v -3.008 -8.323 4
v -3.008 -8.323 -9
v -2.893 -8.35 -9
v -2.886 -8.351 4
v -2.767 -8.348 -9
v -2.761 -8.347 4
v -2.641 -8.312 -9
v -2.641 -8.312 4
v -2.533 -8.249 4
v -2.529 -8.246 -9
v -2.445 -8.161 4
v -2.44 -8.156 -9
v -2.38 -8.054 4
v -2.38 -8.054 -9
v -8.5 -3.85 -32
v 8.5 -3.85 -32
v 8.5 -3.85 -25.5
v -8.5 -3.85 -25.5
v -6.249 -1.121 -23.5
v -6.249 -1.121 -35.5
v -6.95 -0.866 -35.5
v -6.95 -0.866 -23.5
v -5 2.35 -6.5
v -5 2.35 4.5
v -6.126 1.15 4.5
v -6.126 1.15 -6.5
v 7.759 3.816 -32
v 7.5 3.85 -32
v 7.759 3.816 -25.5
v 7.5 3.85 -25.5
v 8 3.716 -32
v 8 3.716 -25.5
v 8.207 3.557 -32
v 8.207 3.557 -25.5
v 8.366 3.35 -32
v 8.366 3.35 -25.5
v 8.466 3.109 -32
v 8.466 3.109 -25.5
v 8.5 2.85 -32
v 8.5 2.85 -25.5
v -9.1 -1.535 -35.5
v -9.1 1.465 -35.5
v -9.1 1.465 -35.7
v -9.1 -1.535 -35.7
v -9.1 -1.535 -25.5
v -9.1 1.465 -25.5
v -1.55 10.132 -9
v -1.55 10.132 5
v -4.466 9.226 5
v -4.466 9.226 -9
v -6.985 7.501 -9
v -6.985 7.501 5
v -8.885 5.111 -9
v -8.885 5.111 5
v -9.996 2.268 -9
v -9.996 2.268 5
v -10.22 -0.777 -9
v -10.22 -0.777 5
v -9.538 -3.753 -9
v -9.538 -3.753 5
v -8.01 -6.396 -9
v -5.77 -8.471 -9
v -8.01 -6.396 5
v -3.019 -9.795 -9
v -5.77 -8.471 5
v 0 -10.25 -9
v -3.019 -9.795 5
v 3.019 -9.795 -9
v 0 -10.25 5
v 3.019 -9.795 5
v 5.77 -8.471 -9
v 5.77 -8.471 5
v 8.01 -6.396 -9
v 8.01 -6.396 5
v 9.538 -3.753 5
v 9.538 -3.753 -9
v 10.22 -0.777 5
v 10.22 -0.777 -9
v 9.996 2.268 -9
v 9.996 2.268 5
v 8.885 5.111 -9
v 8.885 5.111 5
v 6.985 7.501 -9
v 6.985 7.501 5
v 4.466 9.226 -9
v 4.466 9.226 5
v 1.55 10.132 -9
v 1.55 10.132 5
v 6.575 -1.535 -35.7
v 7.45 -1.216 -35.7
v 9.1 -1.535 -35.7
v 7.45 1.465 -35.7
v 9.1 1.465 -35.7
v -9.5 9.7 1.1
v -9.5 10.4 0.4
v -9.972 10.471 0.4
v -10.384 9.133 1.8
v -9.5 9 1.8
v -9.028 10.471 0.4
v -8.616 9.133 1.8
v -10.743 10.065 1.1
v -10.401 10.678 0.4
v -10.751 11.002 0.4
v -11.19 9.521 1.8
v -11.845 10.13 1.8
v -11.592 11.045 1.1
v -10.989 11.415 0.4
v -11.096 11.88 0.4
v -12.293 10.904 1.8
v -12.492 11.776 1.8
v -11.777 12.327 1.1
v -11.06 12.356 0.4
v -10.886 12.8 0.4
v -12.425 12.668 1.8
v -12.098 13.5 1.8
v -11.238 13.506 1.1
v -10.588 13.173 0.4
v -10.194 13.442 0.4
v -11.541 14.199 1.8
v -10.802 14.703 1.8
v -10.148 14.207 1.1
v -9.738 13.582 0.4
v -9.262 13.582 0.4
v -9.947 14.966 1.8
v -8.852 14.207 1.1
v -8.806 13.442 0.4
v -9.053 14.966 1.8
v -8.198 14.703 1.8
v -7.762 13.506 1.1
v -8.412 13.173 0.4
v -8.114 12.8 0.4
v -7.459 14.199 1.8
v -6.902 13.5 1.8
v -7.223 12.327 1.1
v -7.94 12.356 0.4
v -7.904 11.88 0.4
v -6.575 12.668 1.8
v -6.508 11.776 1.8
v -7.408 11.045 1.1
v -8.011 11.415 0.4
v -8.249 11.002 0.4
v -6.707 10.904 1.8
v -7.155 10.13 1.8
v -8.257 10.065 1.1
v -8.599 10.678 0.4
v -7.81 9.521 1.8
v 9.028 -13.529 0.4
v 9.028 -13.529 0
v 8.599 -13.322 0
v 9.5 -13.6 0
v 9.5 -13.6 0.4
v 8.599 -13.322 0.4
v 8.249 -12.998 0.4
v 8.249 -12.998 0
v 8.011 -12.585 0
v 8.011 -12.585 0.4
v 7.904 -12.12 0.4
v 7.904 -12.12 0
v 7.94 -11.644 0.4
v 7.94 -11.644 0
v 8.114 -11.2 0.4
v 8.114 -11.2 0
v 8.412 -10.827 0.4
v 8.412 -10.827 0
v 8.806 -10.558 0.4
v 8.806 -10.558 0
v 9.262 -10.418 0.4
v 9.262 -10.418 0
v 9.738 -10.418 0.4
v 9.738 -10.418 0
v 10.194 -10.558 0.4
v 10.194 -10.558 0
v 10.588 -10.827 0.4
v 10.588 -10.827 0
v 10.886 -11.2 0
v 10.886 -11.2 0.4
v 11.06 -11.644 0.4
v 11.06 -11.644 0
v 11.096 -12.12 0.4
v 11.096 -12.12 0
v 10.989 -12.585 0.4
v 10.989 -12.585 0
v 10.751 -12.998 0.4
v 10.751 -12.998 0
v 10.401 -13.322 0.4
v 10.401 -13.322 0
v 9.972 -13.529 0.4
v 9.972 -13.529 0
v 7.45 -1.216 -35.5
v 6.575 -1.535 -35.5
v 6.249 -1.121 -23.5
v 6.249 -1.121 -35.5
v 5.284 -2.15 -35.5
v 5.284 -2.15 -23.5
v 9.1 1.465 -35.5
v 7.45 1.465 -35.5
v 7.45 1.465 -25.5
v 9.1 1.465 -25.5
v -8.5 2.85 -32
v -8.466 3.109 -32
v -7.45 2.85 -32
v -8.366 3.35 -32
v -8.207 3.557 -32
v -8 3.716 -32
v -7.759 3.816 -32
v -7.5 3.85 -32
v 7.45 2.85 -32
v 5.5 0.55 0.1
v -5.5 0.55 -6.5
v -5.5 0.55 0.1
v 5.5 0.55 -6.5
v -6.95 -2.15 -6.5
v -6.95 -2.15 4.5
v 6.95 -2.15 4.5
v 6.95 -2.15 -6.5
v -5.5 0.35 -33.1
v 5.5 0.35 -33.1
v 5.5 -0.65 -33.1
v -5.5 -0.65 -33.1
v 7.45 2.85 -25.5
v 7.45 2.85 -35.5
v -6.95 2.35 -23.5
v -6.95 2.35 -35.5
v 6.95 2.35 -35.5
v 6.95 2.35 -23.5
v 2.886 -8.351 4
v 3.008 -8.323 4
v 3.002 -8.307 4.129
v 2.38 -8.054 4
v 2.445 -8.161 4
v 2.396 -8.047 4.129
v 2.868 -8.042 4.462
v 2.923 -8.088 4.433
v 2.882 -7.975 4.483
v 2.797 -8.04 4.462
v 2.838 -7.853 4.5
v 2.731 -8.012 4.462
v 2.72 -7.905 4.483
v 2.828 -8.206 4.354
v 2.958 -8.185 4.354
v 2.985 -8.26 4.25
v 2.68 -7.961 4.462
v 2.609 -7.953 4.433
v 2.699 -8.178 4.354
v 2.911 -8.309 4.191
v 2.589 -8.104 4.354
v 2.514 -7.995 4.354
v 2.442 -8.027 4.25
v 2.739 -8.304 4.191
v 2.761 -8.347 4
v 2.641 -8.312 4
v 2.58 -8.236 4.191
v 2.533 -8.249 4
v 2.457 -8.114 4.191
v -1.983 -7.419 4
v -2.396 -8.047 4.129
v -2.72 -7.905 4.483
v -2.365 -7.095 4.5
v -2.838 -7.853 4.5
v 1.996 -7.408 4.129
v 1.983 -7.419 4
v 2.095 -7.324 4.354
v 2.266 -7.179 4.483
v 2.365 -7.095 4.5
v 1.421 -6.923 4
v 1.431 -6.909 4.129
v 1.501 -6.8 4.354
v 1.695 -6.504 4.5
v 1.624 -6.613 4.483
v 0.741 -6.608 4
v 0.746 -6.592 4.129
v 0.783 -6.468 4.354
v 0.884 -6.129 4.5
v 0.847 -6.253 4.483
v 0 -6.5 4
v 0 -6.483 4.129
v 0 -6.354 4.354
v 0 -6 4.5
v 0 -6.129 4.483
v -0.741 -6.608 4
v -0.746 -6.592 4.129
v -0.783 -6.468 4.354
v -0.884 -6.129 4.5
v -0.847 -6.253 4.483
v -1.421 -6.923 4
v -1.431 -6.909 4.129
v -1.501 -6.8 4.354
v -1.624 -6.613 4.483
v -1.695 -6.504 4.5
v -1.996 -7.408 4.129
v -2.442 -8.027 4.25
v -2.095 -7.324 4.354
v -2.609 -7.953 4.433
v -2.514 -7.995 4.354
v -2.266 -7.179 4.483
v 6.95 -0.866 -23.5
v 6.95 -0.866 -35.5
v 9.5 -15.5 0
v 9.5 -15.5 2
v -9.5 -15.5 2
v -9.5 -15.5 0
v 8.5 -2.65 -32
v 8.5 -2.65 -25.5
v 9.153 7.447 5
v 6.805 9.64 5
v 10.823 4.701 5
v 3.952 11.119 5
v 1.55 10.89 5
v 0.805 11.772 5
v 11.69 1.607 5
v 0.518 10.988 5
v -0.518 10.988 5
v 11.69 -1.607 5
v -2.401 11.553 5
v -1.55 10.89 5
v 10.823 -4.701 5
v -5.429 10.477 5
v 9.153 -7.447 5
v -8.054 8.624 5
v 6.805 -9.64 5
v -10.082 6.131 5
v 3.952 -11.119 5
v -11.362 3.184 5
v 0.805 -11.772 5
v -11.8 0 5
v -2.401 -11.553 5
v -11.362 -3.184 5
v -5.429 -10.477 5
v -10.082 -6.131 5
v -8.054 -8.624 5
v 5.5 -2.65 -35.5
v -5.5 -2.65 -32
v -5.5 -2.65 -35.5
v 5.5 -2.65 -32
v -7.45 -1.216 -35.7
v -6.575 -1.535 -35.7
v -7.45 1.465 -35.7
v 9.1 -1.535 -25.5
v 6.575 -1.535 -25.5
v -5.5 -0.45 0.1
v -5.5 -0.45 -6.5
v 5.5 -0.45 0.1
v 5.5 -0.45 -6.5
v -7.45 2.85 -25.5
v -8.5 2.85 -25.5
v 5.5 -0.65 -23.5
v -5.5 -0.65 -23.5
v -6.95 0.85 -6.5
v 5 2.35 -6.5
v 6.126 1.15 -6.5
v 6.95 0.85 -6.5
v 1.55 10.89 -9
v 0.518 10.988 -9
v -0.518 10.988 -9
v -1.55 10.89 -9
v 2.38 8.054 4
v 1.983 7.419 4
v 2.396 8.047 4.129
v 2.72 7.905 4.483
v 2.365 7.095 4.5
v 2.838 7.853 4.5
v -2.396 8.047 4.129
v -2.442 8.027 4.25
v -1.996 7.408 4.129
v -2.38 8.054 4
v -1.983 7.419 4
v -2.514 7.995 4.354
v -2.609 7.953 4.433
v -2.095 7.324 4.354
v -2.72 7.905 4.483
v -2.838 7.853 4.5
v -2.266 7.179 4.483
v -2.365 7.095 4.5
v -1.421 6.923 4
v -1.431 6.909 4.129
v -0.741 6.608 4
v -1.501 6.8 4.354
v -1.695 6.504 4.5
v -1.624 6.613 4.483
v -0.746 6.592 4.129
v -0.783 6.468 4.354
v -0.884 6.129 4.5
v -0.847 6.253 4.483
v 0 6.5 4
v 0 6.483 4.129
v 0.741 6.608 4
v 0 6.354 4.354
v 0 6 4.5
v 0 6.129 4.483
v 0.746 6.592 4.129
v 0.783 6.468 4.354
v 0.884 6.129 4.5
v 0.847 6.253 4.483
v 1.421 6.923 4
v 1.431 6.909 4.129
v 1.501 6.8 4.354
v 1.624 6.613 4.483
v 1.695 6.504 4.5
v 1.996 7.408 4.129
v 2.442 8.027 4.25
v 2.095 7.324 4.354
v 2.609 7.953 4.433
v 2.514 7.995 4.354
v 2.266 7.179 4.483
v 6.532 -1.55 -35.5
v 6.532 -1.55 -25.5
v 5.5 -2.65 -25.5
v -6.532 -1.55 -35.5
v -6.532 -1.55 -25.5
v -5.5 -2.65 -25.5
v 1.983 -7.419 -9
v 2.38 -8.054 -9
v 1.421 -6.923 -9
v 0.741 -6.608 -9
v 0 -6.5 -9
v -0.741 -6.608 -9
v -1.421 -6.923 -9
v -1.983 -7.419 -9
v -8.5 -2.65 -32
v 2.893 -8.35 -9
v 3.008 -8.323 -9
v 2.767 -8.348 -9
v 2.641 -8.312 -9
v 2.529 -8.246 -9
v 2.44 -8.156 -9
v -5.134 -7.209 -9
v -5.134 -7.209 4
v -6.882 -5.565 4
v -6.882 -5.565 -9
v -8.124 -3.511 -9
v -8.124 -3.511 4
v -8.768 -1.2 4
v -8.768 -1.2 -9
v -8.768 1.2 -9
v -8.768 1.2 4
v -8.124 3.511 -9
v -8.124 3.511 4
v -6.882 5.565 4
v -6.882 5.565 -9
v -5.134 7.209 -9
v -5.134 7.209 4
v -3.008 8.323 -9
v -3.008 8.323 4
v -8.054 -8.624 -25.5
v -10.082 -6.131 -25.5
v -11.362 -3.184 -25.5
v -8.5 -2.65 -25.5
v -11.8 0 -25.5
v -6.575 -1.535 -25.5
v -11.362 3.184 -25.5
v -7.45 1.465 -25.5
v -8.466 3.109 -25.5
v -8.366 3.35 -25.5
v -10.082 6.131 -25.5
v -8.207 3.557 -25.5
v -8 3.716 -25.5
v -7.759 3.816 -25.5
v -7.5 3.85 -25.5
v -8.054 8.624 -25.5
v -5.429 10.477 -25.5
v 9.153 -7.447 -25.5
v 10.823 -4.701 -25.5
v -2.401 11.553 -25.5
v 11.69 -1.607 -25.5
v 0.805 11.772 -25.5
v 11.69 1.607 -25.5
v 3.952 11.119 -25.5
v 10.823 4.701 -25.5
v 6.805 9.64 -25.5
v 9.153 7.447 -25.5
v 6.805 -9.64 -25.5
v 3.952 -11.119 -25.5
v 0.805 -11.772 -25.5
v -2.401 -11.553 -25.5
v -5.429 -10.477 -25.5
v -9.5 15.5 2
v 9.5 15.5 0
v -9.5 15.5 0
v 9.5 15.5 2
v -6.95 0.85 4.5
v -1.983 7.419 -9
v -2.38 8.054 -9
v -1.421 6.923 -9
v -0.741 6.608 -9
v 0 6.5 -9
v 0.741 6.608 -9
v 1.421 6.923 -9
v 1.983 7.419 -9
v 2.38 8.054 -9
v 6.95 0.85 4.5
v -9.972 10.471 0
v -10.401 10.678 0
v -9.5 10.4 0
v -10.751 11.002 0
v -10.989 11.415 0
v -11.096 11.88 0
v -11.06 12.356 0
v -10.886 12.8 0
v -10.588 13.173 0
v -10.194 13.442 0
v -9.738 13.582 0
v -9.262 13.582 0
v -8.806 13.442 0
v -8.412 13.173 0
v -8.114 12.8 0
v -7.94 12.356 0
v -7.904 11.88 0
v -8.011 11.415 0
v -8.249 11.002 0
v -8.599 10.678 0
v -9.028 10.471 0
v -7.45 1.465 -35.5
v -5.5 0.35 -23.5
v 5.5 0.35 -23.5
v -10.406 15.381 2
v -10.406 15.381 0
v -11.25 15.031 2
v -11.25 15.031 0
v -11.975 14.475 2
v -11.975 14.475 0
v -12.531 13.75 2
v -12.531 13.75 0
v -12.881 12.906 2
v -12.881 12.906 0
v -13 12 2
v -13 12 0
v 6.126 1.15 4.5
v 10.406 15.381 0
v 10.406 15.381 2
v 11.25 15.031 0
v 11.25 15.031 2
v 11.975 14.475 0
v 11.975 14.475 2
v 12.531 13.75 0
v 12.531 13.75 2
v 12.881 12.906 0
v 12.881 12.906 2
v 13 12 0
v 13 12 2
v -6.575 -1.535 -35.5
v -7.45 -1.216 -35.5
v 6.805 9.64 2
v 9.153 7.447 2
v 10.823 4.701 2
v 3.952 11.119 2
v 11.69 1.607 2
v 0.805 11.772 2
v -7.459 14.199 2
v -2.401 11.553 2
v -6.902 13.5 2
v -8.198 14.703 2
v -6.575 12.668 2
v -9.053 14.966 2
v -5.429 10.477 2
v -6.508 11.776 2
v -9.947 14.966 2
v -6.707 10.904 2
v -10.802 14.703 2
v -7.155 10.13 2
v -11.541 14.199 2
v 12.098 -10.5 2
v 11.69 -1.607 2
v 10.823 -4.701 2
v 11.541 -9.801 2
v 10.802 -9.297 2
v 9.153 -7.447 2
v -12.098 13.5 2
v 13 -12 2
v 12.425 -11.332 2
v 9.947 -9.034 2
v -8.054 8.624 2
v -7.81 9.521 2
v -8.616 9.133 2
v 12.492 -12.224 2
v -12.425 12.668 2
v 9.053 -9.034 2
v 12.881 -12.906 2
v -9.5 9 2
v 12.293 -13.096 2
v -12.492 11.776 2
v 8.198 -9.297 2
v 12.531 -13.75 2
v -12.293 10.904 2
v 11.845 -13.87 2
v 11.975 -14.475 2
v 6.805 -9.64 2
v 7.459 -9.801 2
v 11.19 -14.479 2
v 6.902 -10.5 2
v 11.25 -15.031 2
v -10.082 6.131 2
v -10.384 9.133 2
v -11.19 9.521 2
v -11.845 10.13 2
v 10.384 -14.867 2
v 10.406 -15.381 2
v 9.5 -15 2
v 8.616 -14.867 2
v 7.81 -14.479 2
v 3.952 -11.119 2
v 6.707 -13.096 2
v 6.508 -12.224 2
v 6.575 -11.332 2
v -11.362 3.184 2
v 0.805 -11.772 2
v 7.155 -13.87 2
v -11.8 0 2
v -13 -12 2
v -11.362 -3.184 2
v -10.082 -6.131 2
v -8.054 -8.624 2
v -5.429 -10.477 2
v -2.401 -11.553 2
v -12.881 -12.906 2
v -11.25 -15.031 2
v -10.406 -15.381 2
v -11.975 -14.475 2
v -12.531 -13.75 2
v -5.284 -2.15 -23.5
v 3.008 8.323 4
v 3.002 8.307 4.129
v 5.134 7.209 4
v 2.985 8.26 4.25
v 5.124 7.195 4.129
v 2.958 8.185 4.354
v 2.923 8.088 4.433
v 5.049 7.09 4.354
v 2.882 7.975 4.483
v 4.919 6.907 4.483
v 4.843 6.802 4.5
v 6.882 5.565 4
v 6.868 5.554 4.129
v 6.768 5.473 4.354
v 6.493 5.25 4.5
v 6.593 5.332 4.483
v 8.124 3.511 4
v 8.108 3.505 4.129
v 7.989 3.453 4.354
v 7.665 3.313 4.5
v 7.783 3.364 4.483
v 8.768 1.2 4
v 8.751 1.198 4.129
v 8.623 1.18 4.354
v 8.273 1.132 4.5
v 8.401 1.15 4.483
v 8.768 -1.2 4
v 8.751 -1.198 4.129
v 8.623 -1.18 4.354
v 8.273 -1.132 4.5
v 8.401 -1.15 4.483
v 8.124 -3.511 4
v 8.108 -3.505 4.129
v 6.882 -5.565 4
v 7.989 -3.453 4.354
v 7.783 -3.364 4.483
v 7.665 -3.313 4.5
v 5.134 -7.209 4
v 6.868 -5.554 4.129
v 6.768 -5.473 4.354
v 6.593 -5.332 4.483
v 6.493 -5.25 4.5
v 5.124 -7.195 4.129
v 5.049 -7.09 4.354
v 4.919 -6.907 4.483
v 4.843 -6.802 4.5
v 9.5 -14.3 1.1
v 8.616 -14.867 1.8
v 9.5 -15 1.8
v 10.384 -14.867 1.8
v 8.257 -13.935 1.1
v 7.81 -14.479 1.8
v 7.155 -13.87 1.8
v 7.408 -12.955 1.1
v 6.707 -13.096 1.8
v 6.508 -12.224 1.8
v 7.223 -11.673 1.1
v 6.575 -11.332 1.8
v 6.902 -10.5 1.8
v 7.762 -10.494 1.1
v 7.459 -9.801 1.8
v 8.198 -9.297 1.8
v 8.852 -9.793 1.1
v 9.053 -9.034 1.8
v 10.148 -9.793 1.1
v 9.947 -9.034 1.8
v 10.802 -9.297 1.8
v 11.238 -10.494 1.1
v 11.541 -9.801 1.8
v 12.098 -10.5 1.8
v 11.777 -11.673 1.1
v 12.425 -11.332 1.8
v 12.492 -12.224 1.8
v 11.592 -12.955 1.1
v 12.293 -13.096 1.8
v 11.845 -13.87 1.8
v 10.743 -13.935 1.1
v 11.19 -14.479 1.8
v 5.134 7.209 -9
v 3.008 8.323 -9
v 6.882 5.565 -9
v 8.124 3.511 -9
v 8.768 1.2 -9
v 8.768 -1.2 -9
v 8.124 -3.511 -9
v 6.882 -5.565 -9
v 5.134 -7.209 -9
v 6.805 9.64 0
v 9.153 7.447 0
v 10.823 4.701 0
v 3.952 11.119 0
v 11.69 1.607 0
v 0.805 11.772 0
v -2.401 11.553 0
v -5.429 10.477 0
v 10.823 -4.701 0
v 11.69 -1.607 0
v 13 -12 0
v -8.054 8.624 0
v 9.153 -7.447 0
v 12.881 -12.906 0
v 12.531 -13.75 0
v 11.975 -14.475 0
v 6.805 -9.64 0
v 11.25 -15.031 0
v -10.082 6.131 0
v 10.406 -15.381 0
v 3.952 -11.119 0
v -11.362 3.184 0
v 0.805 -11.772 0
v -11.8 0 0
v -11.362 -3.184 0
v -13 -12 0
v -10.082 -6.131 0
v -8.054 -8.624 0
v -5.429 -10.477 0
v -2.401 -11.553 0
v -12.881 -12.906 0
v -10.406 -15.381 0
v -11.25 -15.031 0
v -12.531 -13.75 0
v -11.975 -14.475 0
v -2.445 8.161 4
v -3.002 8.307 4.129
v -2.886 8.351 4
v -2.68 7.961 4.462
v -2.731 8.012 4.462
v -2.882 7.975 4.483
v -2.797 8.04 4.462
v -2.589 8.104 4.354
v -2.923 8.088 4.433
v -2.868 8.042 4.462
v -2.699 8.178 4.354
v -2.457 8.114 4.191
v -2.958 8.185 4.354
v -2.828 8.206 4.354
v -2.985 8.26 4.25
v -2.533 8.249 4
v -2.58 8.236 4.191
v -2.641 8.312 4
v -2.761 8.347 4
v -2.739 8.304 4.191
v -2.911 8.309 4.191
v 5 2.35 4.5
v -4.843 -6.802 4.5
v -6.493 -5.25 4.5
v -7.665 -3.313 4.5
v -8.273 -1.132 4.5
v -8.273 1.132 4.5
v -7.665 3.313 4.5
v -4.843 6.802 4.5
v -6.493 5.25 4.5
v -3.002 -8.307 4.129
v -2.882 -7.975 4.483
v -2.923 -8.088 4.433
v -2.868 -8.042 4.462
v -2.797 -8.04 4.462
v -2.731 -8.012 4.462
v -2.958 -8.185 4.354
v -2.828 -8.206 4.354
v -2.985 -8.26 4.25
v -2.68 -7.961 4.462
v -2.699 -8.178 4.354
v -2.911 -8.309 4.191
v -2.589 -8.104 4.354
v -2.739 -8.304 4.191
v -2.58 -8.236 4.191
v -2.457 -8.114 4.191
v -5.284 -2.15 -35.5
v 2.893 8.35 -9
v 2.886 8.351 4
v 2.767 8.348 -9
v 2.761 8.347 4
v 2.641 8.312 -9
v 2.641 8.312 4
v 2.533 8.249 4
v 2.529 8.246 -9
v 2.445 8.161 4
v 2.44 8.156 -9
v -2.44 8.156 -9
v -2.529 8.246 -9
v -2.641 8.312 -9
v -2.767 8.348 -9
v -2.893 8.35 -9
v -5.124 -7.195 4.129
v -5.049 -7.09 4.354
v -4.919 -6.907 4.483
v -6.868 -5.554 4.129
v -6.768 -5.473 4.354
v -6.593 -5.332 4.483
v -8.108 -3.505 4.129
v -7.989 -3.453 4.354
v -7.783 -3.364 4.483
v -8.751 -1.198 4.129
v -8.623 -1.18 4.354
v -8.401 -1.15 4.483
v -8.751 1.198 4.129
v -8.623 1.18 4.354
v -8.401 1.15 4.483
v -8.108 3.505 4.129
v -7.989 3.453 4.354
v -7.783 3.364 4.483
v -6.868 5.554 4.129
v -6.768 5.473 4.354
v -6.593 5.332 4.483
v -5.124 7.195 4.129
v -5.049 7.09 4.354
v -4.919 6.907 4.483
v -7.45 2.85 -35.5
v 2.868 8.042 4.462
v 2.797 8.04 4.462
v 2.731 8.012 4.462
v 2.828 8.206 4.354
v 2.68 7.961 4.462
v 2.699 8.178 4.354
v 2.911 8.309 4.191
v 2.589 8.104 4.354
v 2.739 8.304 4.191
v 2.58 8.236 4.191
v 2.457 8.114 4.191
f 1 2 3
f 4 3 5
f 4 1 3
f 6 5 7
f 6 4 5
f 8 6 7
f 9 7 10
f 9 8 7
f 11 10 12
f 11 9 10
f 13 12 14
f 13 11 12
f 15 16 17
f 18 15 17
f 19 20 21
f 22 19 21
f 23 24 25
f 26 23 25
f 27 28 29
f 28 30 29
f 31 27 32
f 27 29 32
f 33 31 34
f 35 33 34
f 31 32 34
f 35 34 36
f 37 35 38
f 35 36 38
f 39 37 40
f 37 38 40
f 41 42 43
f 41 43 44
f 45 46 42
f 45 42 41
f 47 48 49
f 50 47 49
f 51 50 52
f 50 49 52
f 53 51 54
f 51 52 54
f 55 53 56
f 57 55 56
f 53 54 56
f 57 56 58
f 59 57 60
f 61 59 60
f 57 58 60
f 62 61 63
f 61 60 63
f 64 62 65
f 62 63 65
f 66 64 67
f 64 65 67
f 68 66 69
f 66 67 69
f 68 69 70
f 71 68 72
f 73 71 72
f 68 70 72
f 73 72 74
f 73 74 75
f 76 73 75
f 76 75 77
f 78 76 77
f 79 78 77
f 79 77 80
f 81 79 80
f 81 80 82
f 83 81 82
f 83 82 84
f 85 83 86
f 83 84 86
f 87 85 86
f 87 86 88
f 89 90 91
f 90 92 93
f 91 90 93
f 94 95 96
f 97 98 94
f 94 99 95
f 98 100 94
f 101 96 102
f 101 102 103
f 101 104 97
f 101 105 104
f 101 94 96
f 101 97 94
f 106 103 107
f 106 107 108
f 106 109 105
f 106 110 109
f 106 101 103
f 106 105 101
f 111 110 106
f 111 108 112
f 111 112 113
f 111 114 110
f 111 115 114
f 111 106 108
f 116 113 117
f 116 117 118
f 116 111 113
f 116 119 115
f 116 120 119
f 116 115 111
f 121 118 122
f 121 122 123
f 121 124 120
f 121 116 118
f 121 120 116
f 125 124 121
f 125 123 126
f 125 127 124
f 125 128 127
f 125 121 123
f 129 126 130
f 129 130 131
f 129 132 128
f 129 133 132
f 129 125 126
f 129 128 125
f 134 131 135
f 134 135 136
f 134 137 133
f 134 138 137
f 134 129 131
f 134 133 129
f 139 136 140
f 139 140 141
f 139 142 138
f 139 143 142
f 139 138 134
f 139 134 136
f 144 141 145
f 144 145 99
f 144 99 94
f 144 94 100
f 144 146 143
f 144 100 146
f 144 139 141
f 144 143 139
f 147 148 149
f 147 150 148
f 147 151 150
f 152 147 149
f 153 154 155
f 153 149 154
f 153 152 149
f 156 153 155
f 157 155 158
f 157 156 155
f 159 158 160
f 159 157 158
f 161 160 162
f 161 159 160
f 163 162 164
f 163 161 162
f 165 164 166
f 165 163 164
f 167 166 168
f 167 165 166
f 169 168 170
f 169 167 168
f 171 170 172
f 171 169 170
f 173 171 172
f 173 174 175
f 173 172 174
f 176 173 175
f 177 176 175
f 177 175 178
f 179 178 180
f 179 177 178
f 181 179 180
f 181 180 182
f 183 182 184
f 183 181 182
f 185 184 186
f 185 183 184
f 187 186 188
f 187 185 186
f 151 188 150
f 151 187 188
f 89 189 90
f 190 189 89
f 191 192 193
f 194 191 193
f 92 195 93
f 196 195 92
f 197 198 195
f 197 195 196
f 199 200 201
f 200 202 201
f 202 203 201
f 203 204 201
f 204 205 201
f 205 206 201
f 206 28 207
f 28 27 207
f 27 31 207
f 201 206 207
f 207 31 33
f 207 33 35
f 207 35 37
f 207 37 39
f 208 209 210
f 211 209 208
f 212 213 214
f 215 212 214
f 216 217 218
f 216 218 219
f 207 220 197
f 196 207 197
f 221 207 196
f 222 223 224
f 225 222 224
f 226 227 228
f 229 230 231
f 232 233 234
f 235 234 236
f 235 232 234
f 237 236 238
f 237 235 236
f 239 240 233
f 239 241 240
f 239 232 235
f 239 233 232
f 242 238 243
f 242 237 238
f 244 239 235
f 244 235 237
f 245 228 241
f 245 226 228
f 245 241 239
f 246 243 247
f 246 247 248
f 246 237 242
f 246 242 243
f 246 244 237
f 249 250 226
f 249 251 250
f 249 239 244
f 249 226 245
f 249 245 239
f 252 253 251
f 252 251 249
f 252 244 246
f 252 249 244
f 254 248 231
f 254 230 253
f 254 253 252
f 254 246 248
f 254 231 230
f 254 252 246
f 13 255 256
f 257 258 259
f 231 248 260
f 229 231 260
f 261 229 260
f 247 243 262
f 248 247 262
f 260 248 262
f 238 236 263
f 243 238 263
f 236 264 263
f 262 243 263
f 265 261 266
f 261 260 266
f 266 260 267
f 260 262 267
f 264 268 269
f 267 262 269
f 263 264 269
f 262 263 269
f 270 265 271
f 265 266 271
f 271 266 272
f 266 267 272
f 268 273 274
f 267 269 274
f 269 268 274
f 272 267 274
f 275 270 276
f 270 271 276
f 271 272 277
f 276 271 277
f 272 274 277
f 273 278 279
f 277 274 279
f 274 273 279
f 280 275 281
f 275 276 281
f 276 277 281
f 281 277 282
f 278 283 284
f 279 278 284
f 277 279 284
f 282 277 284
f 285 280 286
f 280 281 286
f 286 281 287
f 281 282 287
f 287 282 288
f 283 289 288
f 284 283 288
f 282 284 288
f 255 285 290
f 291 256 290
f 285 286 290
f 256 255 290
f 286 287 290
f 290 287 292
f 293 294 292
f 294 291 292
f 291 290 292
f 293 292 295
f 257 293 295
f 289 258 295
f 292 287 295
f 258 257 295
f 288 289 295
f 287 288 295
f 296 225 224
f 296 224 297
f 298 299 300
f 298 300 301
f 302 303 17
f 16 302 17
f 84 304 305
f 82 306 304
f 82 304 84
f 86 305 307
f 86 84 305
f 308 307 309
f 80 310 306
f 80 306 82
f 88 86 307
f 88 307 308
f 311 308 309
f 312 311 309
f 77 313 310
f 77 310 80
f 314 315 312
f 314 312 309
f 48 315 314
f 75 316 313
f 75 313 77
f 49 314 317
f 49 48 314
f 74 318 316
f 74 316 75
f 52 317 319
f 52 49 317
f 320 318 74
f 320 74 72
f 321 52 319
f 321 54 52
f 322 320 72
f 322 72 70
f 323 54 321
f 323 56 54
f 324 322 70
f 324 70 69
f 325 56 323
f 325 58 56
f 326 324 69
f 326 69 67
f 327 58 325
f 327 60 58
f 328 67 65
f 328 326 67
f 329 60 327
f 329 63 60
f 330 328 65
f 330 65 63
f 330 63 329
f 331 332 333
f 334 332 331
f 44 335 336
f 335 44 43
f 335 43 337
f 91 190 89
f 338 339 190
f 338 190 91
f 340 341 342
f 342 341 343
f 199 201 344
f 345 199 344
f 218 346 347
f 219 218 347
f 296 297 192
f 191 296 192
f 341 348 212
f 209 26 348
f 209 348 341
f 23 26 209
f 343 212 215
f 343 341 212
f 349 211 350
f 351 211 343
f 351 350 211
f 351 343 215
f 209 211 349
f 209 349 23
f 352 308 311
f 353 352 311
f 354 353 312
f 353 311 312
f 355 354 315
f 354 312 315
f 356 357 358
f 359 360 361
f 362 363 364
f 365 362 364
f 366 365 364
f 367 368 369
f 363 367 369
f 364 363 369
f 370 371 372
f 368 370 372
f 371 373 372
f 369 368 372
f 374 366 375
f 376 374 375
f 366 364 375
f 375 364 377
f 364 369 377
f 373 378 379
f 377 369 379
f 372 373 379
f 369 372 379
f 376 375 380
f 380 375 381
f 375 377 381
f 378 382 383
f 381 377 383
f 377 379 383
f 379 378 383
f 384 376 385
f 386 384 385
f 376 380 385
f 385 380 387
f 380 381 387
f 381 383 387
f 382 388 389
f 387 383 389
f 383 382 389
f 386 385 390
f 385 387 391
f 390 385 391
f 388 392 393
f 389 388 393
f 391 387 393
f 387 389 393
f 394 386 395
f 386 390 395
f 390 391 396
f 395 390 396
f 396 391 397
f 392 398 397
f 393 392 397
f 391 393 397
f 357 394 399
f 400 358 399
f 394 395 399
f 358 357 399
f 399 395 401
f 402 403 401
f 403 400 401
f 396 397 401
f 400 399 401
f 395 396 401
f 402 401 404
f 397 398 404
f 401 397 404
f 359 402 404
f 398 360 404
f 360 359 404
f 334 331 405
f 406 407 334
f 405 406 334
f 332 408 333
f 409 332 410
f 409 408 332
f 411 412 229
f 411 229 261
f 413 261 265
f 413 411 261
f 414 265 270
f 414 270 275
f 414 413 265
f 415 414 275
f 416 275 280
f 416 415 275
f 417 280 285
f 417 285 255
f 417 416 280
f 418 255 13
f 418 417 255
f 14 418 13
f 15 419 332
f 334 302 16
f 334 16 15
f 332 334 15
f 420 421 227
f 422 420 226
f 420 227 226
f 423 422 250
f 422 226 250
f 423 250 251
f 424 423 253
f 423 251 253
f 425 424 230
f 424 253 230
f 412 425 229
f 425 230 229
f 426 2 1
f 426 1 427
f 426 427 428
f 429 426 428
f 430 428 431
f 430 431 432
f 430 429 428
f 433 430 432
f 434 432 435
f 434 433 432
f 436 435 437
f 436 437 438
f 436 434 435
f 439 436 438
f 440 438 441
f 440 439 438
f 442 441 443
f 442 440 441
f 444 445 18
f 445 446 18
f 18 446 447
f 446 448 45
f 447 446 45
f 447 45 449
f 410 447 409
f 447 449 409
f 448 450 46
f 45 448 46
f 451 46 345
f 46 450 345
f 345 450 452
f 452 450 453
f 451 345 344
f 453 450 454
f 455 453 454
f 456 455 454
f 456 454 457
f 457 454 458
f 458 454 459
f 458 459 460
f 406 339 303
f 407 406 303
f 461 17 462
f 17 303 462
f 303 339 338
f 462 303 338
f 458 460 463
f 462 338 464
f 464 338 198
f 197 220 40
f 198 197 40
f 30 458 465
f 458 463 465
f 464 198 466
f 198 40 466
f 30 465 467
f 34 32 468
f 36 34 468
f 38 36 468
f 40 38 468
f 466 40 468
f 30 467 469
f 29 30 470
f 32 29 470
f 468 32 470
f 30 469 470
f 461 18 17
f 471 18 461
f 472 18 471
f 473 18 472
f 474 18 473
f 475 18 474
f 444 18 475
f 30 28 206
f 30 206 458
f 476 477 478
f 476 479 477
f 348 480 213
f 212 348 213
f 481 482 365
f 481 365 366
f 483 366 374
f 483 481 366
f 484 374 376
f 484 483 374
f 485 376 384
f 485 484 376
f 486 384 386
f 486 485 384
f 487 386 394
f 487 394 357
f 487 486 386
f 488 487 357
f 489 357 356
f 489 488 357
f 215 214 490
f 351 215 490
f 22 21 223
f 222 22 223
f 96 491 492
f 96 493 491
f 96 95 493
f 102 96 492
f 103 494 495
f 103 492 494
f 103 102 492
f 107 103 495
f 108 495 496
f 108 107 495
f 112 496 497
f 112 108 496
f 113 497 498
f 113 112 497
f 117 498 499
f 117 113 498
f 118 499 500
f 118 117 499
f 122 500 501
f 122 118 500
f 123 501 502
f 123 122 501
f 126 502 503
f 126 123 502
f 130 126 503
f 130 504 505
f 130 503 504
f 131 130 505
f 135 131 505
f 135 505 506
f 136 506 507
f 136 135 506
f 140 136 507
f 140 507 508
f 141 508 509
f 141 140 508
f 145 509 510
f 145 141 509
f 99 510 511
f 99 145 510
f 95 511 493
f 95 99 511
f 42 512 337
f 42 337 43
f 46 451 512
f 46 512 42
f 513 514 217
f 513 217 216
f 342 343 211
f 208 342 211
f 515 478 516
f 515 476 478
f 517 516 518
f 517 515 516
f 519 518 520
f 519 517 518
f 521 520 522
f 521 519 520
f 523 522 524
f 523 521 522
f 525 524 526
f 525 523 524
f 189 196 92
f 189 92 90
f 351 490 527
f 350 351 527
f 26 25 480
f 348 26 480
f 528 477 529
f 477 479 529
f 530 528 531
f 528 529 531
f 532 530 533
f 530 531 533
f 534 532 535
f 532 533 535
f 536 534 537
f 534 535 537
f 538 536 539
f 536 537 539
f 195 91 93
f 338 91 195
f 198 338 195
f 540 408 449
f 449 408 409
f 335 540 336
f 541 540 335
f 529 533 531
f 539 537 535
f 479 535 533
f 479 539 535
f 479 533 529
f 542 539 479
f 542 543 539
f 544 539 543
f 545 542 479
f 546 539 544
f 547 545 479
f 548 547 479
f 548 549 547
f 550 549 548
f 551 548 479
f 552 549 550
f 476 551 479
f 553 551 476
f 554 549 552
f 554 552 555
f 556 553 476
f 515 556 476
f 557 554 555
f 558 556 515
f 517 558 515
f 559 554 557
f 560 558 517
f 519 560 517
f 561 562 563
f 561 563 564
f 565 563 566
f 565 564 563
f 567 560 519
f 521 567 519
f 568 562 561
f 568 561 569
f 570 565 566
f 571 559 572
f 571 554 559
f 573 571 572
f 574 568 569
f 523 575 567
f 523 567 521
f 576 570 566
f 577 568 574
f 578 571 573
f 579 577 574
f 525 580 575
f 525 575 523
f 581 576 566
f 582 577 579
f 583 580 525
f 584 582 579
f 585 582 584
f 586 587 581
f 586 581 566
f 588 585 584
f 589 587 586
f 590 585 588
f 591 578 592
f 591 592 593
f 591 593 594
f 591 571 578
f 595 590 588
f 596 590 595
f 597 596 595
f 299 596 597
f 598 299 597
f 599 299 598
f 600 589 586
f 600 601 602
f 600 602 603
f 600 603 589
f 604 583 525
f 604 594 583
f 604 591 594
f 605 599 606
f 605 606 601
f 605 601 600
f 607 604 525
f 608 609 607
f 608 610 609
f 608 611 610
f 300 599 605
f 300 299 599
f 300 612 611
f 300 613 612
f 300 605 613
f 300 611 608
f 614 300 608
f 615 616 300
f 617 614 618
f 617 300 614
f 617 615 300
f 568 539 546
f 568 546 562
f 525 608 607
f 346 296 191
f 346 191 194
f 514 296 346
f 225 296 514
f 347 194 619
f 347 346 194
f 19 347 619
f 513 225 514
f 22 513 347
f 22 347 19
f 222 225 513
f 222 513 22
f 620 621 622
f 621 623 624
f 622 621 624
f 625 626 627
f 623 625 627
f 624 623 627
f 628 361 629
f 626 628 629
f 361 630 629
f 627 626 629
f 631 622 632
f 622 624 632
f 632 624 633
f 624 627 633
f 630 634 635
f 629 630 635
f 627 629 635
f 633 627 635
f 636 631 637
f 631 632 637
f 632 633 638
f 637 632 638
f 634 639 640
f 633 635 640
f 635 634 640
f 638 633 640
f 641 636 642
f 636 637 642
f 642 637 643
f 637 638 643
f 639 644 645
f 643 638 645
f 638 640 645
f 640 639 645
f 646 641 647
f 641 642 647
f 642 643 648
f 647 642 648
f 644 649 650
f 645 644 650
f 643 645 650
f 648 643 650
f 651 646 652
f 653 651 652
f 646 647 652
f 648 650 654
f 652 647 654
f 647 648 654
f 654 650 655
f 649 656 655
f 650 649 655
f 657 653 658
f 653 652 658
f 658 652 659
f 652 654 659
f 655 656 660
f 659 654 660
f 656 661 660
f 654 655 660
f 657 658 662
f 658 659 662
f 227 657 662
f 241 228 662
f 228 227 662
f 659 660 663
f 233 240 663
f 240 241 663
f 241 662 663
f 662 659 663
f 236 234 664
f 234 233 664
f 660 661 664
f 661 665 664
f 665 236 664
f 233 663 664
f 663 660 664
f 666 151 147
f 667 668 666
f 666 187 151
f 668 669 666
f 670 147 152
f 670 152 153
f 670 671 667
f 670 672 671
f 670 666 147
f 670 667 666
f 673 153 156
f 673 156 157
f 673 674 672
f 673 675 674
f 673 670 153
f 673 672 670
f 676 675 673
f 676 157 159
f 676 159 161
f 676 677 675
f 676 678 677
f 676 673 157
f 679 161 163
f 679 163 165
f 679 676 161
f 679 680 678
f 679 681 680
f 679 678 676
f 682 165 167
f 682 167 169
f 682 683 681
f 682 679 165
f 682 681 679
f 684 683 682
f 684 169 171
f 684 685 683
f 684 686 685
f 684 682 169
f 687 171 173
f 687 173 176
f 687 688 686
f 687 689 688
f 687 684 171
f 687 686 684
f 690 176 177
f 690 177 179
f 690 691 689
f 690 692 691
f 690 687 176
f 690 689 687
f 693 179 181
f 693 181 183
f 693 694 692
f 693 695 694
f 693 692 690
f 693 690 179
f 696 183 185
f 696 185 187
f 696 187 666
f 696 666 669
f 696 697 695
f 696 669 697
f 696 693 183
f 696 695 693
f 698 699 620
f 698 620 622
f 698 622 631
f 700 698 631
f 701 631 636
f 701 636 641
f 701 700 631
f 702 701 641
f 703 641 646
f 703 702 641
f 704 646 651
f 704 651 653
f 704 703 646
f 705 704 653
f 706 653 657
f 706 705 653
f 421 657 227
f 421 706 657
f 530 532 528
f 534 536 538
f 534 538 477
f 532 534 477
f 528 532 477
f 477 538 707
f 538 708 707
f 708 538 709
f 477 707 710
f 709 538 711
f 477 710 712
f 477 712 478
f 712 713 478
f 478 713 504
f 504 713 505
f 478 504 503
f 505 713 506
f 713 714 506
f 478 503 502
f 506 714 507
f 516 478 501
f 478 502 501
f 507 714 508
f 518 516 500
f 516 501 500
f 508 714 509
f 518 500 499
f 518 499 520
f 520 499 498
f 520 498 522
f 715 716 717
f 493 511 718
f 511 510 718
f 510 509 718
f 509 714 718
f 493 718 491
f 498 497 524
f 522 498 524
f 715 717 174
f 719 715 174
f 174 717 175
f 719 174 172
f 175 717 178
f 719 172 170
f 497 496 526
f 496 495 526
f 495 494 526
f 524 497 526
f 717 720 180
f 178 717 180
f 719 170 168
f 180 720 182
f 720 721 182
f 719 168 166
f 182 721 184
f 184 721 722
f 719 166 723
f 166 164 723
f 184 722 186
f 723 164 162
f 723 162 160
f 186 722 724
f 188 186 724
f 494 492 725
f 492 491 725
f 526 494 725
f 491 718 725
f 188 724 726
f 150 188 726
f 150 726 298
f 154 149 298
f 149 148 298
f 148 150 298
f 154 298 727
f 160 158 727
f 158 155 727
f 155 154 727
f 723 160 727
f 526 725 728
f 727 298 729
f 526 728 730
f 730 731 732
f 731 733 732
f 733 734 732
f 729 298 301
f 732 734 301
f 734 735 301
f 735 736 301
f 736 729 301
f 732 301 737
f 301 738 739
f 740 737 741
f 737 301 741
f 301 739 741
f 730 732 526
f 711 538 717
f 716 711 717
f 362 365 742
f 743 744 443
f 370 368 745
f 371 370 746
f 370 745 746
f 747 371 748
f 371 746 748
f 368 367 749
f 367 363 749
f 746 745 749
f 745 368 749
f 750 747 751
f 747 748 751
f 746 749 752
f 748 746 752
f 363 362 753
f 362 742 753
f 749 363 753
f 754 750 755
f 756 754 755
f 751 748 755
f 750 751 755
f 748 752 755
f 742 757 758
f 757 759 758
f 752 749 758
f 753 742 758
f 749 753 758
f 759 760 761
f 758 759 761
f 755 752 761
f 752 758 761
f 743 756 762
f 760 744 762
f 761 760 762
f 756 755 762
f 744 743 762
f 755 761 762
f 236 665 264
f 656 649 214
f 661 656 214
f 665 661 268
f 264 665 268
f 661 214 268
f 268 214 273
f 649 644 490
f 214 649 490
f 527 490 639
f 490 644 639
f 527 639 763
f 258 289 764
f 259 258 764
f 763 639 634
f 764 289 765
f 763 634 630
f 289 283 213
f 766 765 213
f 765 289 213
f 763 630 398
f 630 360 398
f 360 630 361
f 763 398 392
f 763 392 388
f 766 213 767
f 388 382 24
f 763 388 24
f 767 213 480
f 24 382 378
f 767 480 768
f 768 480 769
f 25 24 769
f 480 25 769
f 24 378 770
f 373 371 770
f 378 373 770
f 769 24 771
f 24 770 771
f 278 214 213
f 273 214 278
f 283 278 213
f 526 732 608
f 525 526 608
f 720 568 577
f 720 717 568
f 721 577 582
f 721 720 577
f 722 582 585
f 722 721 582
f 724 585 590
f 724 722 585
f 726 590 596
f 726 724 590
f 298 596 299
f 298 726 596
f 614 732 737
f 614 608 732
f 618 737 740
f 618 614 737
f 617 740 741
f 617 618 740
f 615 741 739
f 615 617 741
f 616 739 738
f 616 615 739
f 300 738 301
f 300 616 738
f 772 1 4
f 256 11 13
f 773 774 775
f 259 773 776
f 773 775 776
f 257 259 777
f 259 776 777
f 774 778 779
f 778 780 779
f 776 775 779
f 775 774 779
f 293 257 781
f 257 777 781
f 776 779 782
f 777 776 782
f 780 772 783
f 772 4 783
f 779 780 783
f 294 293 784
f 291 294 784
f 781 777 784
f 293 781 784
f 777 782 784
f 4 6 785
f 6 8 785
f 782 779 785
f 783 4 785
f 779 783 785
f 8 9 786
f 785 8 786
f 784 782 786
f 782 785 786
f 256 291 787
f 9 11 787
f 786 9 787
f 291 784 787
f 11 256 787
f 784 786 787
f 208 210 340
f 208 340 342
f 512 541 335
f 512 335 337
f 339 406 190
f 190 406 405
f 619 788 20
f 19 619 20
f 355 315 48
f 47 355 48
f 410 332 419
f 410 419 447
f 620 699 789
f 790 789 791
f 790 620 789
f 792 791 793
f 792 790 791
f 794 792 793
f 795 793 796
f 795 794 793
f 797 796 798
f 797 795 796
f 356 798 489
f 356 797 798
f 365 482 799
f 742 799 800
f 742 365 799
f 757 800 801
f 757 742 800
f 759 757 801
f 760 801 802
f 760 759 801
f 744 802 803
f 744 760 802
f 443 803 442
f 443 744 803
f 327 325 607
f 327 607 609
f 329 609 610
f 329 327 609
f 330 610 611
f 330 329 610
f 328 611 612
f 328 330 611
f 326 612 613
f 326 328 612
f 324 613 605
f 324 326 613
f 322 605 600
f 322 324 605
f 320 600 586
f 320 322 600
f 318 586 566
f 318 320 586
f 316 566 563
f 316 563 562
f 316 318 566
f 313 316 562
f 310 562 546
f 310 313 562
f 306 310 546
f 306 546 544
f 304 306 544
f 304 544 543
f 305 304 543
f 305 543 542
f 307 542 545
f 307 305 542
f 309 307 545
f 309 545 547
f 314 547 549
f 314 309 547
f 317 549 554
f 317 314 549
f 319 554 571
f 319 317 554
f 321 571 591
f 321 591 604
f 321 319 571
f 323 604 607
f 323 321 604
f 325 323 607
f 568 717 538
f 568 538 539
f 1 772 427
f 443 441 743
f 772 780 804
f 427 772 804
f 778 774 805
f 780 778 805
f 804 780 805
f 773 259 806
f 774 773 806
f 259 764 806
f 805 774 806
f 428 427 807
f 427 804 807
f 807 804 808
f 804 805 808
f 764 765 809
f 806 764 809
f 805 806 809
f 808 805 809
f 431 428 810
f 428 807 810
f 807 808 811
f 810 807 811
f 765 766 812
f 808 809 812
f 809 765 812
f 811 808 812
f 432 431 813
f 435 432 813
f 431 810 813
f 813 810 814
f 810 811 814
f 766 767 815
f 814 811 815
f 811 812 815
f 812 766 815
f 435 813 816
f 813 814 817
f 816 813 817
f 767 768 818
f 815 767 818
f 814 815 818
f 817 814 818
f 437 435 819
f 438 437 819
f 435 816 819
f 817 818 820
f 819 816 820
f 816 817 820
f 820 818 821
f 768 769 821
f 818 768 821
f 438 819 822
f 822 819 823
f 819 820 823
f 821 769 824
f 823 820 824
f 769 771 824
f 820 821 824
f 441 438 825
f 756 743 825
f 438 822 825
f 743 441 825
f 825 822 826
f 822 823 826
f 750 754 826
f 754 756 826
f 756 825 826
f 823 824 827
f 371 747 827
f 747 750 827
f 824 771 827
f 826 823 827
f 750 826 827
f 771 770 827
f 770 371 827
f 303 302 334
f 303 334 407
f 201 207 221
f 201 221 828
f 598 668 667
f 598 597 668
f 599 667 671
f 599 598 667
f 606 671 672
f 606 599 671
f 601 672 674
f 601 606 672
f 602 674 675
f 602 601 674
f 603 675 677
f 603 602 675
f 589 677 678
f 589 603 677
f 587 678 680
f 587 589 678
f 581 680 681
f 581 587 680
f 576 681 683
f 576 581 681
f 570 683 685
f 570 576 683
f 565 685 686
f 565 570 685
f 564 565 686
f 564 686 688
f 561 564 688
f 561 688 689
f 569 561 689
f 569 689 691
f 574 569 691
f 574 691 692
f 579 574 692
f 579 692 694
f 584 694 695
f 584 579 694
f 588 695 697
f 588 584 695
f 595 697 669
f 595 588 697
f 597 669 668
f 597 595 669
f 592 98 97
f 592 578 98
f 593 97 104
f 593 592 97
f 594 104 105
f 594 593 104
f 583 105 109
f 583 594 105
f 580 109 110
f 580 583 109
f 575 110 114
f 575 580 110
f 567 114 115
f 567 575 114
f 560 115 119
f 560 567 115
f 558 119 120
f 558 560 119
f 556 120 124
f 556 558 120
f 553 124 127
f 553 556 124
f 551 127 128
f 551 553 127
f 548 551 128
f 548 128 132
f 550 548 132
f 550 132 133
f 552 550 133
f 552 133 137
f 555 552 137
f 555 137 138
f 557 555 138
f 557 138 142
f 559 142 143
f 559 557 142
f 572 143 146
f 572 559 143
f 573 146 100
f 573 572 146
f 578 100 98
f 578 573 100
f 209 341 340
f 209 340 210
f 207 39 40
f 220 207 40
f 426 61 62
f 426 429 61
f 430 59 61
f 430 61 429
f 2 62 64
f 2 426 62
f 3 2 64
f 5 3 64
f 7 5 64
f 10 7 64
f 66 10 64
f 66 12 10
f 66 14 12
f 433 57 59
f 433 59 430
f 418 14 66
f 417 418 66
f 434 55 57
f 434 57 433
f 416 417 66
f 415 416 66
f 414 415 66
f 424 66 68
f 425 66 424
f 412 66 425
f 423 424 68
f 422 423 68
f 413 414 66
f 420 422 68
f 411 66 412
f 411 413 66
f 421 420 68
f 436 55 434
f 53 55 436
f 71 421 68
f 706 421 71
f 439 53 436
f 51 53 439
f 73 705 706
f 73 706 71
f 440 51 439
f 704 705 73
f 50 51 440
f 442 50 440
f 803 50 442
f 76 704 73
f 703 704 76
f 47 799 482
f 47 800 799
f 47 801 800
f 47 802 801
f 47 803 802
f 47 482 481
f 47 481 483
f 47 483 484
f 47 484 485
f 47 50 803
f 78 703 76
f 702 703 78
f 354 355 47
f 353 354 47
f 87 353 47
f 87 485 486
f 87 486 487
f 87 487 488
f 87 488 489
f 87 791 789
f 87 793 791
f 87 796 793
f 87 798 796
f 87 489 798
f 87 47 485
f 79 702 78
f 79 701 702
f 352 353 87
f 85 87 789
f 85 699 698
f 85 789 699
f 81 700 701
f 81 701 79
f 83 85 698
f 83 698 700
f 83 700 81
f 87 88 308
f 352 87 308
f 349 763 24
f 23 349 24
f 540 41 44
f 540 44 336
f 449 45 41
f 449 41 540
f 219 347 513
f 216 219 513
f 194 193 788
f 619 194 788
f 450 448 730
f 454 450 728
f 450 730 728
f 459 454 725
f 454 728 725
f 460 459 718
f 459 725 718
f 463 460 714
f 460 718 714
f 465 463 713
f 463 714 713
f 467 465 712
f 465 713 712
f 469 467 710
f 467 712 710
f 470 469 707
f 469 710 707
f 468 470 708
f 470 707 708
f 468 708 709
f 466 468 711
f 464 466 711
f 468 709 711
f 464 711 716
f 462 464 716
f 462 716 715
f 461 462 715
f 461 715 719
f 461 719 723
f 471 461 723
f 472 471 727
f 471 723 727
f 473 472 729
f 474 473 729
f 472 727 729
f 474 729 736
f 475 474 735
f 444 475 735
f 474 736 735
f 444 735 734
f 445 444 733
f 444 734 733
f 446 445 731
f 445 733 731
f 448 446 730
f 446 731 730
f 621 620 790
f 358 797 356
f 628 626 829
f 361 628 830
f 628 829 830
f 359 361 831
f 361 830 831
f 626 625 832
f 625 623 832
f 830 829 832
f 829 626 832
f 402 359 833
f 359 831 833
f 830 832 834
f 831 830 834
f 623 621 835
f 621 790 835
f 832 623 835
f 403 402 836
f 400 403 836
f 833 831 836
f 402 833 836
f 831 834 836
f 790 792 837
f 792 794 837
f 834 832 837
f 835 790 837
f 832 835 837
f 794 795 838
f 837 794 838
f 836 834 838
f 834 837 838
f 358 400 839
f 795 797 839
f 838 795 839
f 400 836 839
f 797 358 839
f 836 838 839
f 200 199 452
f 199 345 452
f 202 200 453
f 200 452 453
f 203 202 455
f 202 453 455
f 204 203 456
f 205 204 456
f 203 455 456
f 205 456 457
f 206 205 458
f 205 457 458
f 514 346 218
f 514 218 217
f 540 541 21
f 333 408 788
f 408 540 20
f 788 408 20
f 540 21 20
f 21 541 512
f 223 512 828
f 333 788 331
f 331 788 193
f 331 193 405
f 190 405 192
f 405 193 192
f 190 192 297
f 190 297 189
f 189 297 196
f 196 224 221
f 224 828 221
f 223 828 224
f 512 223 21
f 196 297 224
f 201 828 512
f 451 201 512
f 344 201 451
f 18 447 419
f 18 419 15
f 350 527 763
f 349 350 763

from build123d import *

# Parameters (mm, degrees)
ESQUISSE1_W                                 = 11.8
ESQUISSE1_H                                 = 25.5
ESQUISSE2_W                                 = 24.8
ESQUISSE2_H                                 = 27.3
BOSS_EXTRU_1_DEPTH                          = 2
ESQUISSE3_W                                 = 2
ESQUISSE3_H                                 = 27.3
BOSS_EXTRU_2_DEPTH                          = 1.2
BOSS_EXTRU_3_DEPTH                          = 10
ESQUISSE5_W                                 = 10
ESQUISSE5_H                                 = 1.115484429
ENL_V_MAT_EXTRU_1_DEPTH                     = 3.6
ESQUISSE6_W                                 = 10
ESQUISSE6_H                                 = 1.384515571
ENL_V_MAT_EXTRU_2_DEPTH                     = 1.65
ESQUISSE7_W                                 = 10
ESQUISSE7_H                                 = 1.384515571
ENL_V_MAT_EXTRU_3_DEPTH                     = 1.65
BOSS_EXTRU_4_DEPTH                          = 0.2
BOSS_EXTRU_5_DEPTH                          = 0.2
ESQUISSE10_W                                = 26
ESQUISSE10_H                                = 2
BOSS_EXTRU_6_DEPTH                          = 3.7
BOSS_EXTRU_7_START                          = 3
ESQUISSE11_R                                = 11.8
BOSS_EXTRU_7_DEPTH                          = 3
ENL_V_MAT_EXTRU_4_DEPTH                     = 14
BOSS_EXTRU_8_DEPTH                          = 13.5
ENL_V_MAT_EXTRU_5_DEPTH                     = 11
ESQUISSE15_W                                = 11
ESQUISSE15_H                                = 1
BOSS_EXTRU_9_DEPTH                          = 6.6
ENL_V_MAT_EXTRU_6_DEPTH                     = 12
ESQUISSE17_W                                = 11
ESQUISSE17_H                                = 1
BOSS_EXTRU_10_DEPTH                         = 9.6
D_POUILLE1_ANGLE                            = 20.013261752
D_POUILLE2_ANGLE                            = 20.013261752
D_POUILLE3_ANGLE                            = 20.013261752
D_POUILLE4_ANGLE                            = 20.013261752
D_POUILLE5_ANGLE                            = 43.186676481
D_POUILLE6_ANGLE                            = 43.186676481
D_POUILLE7_ANGLE                            = 43.186676481
FRAISAGE_POUR_VIS_T_TE_FRAIS_E_M31_AT_COUNT = 2
FRAISAGE_POUR_VIS_T_TE_FRAIS_E_M31_AT_PITCH = 30.61045573
NERVURE1_START                              = -8.5
NERVURE1_OUTLINE_W                          = 1
NERVURE1_OUTLINE_H                          = 6.5
NERVURE1_DEPTH                              = 17
NERVURE2_START                              = -8.5
NERVURE2_OUTLINE_W                          = 1.2
NERVURE2_OUTLINE_H                          = 6.5
NERVURE2_DEPTH                              = 17
CHANFREIN1_SIZE                             = 0.027978428
CHANFREIN1_SIZE2                            = 0.021236921
CHANFREIN2_SIZE                             = 0.027978428
CHANFREIN2_SIZE2                            = 0.021236921
CONG_1_R                                    = 0.5
CONG_2_R                                    = 1
CONG_3_R                                    = 3.5


# Read off the part's stored shape, not the designer's step: Nervure1, Nervure2
with BuildPart() as part:
    # Esquisse1 → Révolution1 (revolve)
    with BuildSketch(Plane.XZ, mode=Mode.PRIVATE) as r_volution1_sk:
        with Locations((5.9, -12.75)):
            Rectangle(ESQUISSE1_W, ESQUISSE1_H)
    revolve(r_volution1_sk.sketch.rotate(Axis((0, 0, 0), (0, 0, -1)), 180), axis=Axis((0, 0, 0), (0, 0, -1)))

    # Esquisse2 → Boss.-Extru.1 (add)
    with BuildSketch(Plane(origin=(0, 0, 0), x_dir=(-1, 0, 0), z_dir=(0, 0, -1))):
        with Locations((0.6, -1.85)):
            Rectangle(ESQUISSE2_W, ESQUISSE2_H)
    extrude(amount=-BOSS_EXTRU_1_DEPTH)

    # Esquisse3 → Boss.-Extru.2 (add)
    with BuildSketch(Plane(origin=(11.8, 0, 0), x_dir=(0, 0, -1), z_dir=(1, 0, 0))):
        with Locations((-1, -1.85)):
            Rectangle(ESQUISSE3_W, ESQUISSE3_H)
    extrude(amount=BOSS_EXTRU_2_DEPTH)

    # Esquisse4 → Boss.-Extru.3 (add)
    with BuildSketch(Plane(origin=(0, 0, -25.5), x_dir=(-1, 0, 0), z_dir=(0, 0, -1))):
        Polygon((-9.1, 2.85), (9.1, 2.85), (9.1, -2.65), (-5.5, -2.65), (-5.5, -1.534515571), (-9.1, -1.534515571), align=None)
    extrude(amount=BOSS_EXTRU_3_DEPTH)

    # Esquisse5 → Enlèv. mat.-Extru.1 (cut)
    with BuildSketch(Plane.ZY.offset(9.1)):
        with Locations((-30.5, -2.092257786)):
            Rectangle(ESQUISSE5_W, ESQUISSE5_H)
    extrude(amount=-ENL_V_MAT_EXTRU_1_DEPTH, mode=Mode.SUBTRACT)

    # Esquisse6 → Enlèv. mat.-Extru.2 (cut)
    with BuildSketch(Plane(origin=(9.1, 0, 0), x_dir=(0, 0, -1), z_dir=(1, 0, 0))):
        with Locations((30.5, 2.157742215)):
            Rectangle(ESQUISSE6_W, ESQUISSE6_H)
    extrude(amount=-ENL_V_MAT_EXTRU_2_DEPTH, mode=Mode.SUBTRACT)

    # Esquisse7 → Enlèv. mat.-Extru.3 (cut)
    with BuildSketch(Plane.ZY.offset(9.1)):
        with Locations((-30.5, 2.157742215)):
            Rectangle(ESQUISSE7_W, ESQUISSE7_H)
    extrude(amount=-ENL_V_MAT_EXTRU_3_DEPTH, mode=Mode.SUBTRACT)

    # Esquisse8 → Boss.-Extru.4 (add)
    with BuildSketch(Plane(origin=(0, 0, -35.5), x_dir=(-1, 0, 0), z_dir=(0, 0, -1))):
        Polygon((-6.575, -1.534515571), (-9.1, -1.534515571), (-9.1, 1.465484429), (-7.45, 1.465484429), (-7.45, -1.215812238), align=None)
    extrude(amount=BOSS_EXTRU_4_DEPTH)

    # Esquisse9 → Boss.-Extru.5 (add)
    with BuildSketch(Plane(origin=(0, 0, -35.5), x_dir=(-1, 0, 0), z_dir=(0, 0, -1))):
        Polygon((6.575, -1.534515571), (7.45, -1.215812238), (7.45, 1.465484429), (9.1, 1.465484429), (9.1, -1.534515571), align=None)
    extrude(amount=BOSS_EXTRU_5_DEPTH)

    # Esquisse10 → Boss.-Extru.6 (add)
    with BuildSketch(Plane(origin=(0, 11.8, 0), x_dir=(-1, 0, 0), z_dir=(0, 1, 0))):
        with Locations((0, 1)):
            Rectangle(ESQUISSE10_W, ESQUISSE10_H)
    extrude(amount=BOSS_EXTRU_6_DEPTH)

    # Esquisse11 → Boss.-Extru.7 (add)
    with BuildSketch(Plane.XY.offset(2).offset(BOSS_EXTRU_7_START)):
        with Locations(Location((0, 0, 0), (0, 0, 180))):
            Circle(ESQUISSE11_R)
    extrude(amount=-BOSS_EXTRU_7_DEPTH)

    # Esquisse12 → Enlèv. mat.-Extru.4 (cut)
    with BuildSketch(Plane.XY.offset(5)):
        with BuildLine():
            Line((1.55, 10.132127121), (1.55, 10.890247931))
            ThreePointArc((1.55, 10.890247931), (0, 11), (-1.55, 10.890247931))
            Line((-1.55, 10.890247931), (-1.55, 10.132127121))
            ThreePointArc((-1.55, 10.132127121), (0, -10.25), (1.55, 10.132127121))
        make_face()
    extrude(amount=-ENL_V_MAT_EXTRU_4_DEPTH, mode=Mode.SUBTRACT)

    # Esquisse13 → Boss.-Extru.8 (add)
    with BuildSketch(Plane.XY.offset(-9)):
        with BuildLine():
            ThreePointArc((2.525486644, -8.482005495), (0, -6.5), (-2.525486644, -8.482005495))
            ThreePointArc((-2.525486644, -8.482005495), (-8.85, 0), (-2.525486644, 8.482005495))
            ThreePointArc((-2.525486644, 8.482005495), (0, 6.5), (2.525486644, 8.482005495))
            ThreePointArc((2.525486644, 8.482005495), (8.85, 0), (2.525486644, -8.482005495))
        make_face()
    extrude(amount=BOSS_EXTRU_8_DEPTH)

    # Esquisse14 → Enlèv. mat.-Extru.5 (cut)
    with BuildSketch(Plane.XY.offset(4.5)):
        Polygon((5, 0.85), (5, 2.35), (-5, 2.35), (-5, 0.85), (-6.95, 0.85), (-6.95, -2.15), (6.95, -2.15), (6.95, 0.85), align=None)
    extrude(amount=-ENL_V_MAT_EXTRU_5_DEPTH, mode=Mode.SUBTRACT)

    # Esquisse15 → Boss.-Extru.9 (add)
    with BuildSketch(Plane.XY.offset(-6.5)):
        with Locations((0, 0.05)):
            Rectangle(ESQUISSE15_W, ESQUISSE15_H)
    extrude(amount=BOSS_EXTRU_9_DEPTH)

    # Esquisse16 → Enlèv. mat.-Extru.6 (cut)
    with BuildSketch(Plane(origin=(0, 0, -35.5), x_dir=(-1, 0, 0), z_dir=(0, 0, -1))):
        Polygon((5.283561654, -2.15), (5.283561654, -0.865794698), (6.95, -0.865794698), (6.95, 2.35), (-6.95, 2.35), (-6.95, -0.865794698), (-5.283561654, -0.865794698), (-5.283561654, -2.15), align=None)
    extrude(amount=-ENL_V_MAT_EXTRU_6_DEPTH, mode=Mode.SUBTRACT)

    # Esquisse17 → Boss.-Extru.10 (add)
    with BuildSketch(Plane(origin=(0, 0, -23.5), x_dir=(-1, 0, 0), z_dir=(0, 0, -1))):
        with Locations((0, -0.15)):
            Rectangle(ESQUISSE17_W, ESQUISSE17_H)
    extrude(amount=BOSS_EXTRU_10_DEPTH)

    # Dépouille1
    d_pouille1_faces = [part.faces().sort_by_distance(p)[0] for p in [
        (-6.116780827, -0.865794698, -29.5),
    ]]
    draft(d_pouille1_faces, Plane(origin=(-6.95, -0.865794698, -23.5), x_dir=(0, 1, 0), z_dir=(1, 0, 0)), D_POUILLE1_ANGLE)

    # Dépouille2
    d_pouille2_faces = [part.faces().sort_by_distance(p)[0] for p in [
        (6.116780827, -0.865794698, -29.5),
    ]]
    draft(d_pouille2_faces, Plane(origin=(6.95, 2.35, -23.5), x_dir=(0, -1, 0), z_dir=(-1, 0, 0)), D_POUILLE2_ANGLE)

    # Dépouille3
    d_pouille3_faces = [part.faces().sort_by_distance(p)[0] for p in [
        (-5.975, 0.85, -1),
    ]]
    draft(d_pouille3_faces, Plane(origin=(-6.95, 0.85, -6.5), x_dir=(0, 1, 0), z_dir=(1, 0, 0)), D_POUILLE3_ANGLE)

    # Dépouille4
    d_pouille4_faces = [part.faces().sort_by_distance(p)[0] for p in [
        (5.975, 0.85, -1),
    ]]
    draft(d_pouille4_faces, Plane(origin=(6.95, -2.15, -6.5), x_dir=(0, 0, -1), z_dir=(-1, 0, 0)), D_POUILLE4_ANGLE)

    # Dépouille5
    d_pouille5_faces = [part.faces().sort_by_distance(p)[0] for p in [
        (5.5, -2.092257785, -30.5),
        (-5.5, -2.092257785, -30.5),
    ]]
    draft(d_pouille5_faces, Plane(origin=(-9.1, -2.65, -35.5), x_dir=(-1, 0, 0), z_dir=(0, -1, 0)), D_POUILLE5_ANGLE)

    # Dépouille6
    d_pouille6_faces = [part.faces().sort_by_distance(p)[0] for p in [
        (-5.283561654, -1.811382752, -29.5),
        (5.283561654, -1.811382752, -29.5),
    ]]
    draft(d_pouille6_faces, Plane(origin=(5.283561654, -2.15, -23.5), x_dir=(1, 0, 0), z_dir=(0, 1, 0)), D_POUILLE6_ANGLE)

    # Dépouille7
    d_pouille7_faces = [part.faces().sort_by_distance(p)[0] for p in [
        (-5, 1.955126571, -1),
        (5, 1.955126571, -1),
    ]]
    draft(d_pouille7_faces, Plane(origin=(5, 2.35, -6.5), x_dir=(-1, 0, 0), z_dir=(0, -1, 0)), D_POUILLE7_ANGLE)

    # Esquisse18 → Fraisage pour vis à tête fraisée M31 (revolve, cut)
    with BuildSketch(Plane(origin=(-9.5, 12, 2), x_dir=(0, -1, 0), z_dir=(1, 0, 0))):
        Polygon((0, 0), (0, 37.700025), (1.6, 37.700025), (1.6, 1.599995685), (3, 0.19999191), (3, 0), align=None)
    fraisage_pour_vis_t_te_frais_e_m31 = revolve(axis=Axis((-9.5, 12, 8.35), (0, 0, -1)), mode=Mode.SUBTRACT)

    # Fraisage pour vis à tête fraisée M31 at: Fraisage pour vis à tête fraisée M31 ×2
    with Locations(*[Vector(0.6207029443655612, -0.7840458244617614, 0) * (i * FRAISAGE_POUR_VIS_T_TE_FRAIS_E_M31_AT_PITCH) for i in range(1, FRAISAGE_POUR_VIS_T_TE_FRAIS_E_M31_AT_COUNT)]):
        add(fraisage_pour_vis_t_te_frais_e_m31, mode=Mode.SUBTRACT)

    # Nervure1 outline → Nervure1 (add)
    with BuildSketch(Plane(origin=(0, 0, 0), x_dir=(0, -1, 0), z_dir=(-1, 0, 0)).offset(NERVURE1_START)):
        with Locations((-3.35, -28.75)):
            Rectangle(NERVURE1_OUTLINE_W, NERVURE1_OUTLINE_H)
    extrude(amount=NERVURE1_DEPTH)

    # Nervure2 outline → Nervure2 (add)
    with BuildSketch(Plane(origin=(0, 0, 0), x_dir=(0, -1, 0), z_dir=(-1, 0, 0)).offset(NERVURE2_START)):
        with Locations((3.25, -28.75)):
            Rectangle(NERVURE2_OUTLINE_W, NERVURE2_OUTLINE_H)
    extrude(amount=NERVURE2_DEPTH)

    # Chanfrein1
    chanfrein1_edges = [part.edges().sort_by_distance(p)[0] for p in [
        (6.547021572, -1.534515571, -30.5),
    ]]
    chanfrein1_side = [part.faces().sort_by_distance(p)[0] for p in [
        (7.823782137, -1.534515571, -30.598925344),
    ]]
    chamfer(chanfrein1_edges, length=CHANFREIN1_SIZE, length2=CHANFREIN1_SIZE2, reference=chanfrein1_side[0])

    # Chanfrein2
    chanfrein2_edges = [part.edges().sort_by_distance(p)[0] for p in [
        (-6.547021572, -1.534515571, -30.5),
    ]]
    chanfrein2_side = [part.faces().sort_by_distance(p)[0] for p in [
        (-7.823782137, -1.534515571, -30.598925344),
    ]]
    chamfer(chanfrein2_edges, length=CHANFREIN2_SIZE, length2=CHANFREIN2_SIZE2, reference=chanfrein2_side[0])

    # Congé1
    cong_1_edges = [part.edges().sort_by_distance(p)[0] for p in [
        (2.525486644, -8.482005495, -2.25),
        (2.525486644, 8.482005495, -2.25),
        (-2.525486644, 8.482005495, -2.25),
        (-2.525486644, -8.482005495, -2.25),
        (8.85, 0, 4.5),
        (0, 6.5, 4.5),
        (-8.85, 0, 4.5),
        (0, -6.5, 4.5),
    ]]
    fillet(cong_1_edges, radius=CONG_1_R)

    # Congé2
    cong_2_edges = [part.edges().sort_by_distance(p)[0] for p in [
        (8.5, 3.85, -28.75),
        (-8.5, 3.85, -28.75),
    ]]
    fillet(cong_2_edges, radius=CONG_2_R - 0.0001)  # a hair under: the kernel refuses the full size

    # Congé3
    cong_3_edges = [part.edges().sort_by_distance(p)[0] for p in [
        (-13, -15.5, 1),
        (13, 15.5, 1),
        (-13, 15.5, 1),
        (13, -15.5, 1),
    ]]
    fillet(cong_3_edges, radius=CONG_3_R)


solid = part.part
